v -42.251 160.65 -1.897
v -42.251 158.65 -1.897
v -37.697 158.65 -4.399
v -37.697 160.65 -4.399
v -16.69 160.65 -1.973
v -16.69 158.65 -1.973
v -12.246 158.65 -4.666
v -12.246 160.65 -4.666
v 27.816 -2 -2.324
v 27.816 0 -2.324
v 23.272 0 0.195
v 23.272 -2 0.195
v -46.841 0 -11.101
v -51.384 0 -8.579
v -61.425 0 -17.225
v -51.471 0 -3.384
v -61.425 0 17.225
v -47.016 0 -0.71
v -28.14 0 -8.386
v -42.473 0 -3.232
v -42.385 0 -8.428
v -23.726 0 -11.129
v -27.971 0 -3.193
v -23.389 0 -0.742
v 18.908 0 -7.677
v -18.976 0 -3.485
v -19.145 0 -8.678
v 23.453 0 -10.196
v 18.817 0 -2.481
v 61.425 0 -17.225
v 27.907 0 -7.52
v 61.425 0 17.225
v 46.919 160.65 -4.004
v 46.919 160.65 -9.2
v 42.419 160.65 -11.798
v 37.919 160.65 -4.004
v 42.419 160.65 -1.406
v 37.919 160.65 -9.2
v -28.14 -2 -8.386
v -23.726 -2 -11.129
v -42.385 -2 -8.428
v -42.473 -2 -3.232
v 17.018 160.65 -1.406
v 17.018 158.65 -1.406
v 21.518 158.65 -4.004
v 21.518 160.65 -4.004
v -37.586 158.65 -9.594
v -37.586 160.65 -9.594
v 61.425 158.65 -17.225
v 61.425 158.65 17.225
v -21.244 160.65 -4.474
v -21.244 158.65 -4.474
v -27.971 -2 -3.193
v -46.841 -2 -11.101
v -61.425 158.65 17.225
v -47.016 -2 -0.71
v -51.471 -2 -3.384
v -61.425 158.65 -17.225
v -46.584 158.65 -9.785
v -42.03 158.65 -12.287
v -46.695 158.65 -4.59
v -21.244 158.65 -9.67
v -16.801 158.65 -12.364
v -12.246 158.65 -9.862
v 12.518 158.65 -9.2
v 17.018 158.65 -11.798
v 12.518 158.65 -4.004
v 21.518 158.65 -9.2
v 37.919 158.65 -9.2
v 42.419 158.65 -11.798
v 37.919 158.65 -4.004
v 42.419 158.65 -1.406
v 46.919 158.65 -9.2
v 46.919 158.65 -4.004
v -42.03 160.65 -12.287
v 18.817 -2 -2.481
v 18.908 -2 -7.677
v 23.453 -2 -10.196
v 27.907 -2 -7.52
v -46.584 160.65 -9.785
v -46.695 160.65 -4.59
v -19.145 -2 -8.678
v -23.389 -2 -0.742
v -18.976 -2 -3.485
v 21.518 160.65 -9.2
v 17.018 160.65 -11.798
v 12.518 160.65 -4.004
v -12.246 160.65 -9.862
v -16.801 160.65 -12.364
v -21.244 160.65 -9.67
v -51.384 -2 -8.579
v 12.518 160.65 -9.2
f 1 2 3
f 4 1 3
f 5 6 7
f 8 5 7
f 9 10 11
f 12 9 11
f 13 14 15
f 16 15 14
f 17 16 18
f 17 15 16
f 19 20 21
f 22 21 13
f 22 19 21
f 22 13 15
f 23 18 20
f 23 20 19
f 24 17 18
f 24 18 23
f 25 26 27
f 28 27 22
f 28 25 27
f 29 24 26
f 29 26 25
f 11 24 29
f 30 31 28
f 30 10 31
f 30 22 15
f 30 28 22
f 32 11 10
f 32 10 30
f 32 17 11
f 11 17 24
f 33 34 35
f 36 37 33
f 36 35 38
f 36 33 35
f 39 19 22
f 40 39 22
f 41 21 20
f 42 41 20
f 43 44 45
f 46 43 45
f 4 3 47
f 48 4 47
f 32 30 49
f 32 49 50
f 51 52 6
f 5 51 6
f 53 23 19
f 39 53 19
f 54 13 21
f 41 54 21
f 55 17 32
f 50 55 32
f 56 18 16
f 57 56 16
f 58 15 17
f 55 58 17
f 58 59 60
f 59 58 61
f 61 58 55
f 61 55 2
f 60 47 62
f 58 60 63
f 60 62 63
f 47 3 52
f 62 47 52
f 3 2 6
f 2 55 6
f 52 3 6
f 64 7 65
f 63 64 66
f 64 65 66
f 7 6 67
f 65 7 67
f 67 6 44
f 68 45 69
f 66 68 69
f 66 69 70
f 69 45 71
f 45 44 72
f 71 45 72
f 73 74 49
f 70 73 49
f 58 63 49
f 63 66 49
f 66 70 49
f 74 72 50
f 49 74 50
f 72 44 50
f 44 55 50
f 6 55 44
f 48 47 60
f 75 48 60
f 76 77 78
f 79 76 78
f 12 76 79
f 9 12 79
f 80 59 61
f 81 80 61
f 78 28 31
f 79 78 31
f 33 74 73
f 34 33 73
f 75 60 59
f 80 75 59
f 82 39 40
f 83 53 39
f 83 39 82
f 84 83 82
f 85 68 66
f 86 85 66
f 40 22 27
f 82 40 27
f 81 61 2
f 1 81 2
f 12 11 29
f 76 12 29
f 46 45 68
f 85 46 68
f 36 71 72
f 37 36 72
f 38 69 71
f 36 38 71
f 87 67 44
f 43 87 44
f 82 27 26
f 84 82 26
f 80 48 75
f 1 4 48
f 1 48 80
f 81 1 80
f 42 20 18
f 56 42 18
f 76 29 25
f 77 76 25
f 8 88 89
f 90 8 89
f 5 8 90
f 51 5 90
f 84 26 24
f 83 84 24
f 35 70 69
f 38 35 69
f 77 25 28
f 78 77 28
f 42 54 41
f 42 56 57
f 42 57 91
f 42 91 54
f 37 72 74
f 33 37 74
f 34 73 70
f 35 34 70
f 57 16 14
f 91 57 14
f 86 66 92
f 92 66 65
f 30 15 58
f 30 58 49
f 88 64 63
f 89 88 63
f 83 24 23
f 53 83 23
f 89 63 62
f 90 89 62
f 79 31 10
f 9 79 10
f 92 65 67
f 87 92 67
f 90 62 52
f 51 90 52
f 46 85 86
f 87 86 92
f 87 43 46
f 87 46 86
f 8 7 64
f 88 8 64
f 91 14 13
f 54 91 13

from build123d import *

# Parameters (mm, degrees)
F0_W     = 122.85
F0_H     = 34.45
F2_DEPTH = 158.65
F3_DEPTH = 2
F7_DEPTH = 2


with BuildPart() as f2:
    # F0 (on Front) → F2 (new body)
    with BuildSketch(Plane.XZ):
        Rectangle(F0_W, F0_H)
    extrude(amount=-F2_DEPTH)

    # F1 (on Front) → F3 (join)
    with BuildSketch(Plane.XZ):
        Polygon((-46.840929, -11.1012), (-42.385265, -8.427801), (-42.472665, -3.232384), (-47.015728, -0.710365), (-51.471391, -3.383764), (-51.383992, -8.579181), align=None)
        Polygon((-23.726419, -11.12884), (-19.144532, -8.678063), (-18.976023, -3.484643), (-23.389402, -0.742001), (-27.97129, -3.192778), (-28.139798, -8.386198), align=None)
        Polygon((23.452608, -10.195813), (27.906654, -7.519719), (27.816112, -2.324356), (23.271524, 0.194914), (18.817478, -2.48118), (18.90802, -7.676543), align=None)
    extrude(amount=F3_DEPTH)

    # F6 (on face) → F7 (join)
    with BuildSketch(Plane(origin=(0, 158.65, 0), x_dir=(-1, 0, 0), z_dir=(0, 1, 0))):
        Polygon((37.586212, -9.593843), (42.029951, -12.287017), (46.584177, -9.785213), (46.694665, -4.590235), (42.250926, -1.897062), (37.696699, -4.398866), align=None)
        Polygon((16.800624, -12.363649), (21.244363, -9.670475), (21.244363, -4.474323), (16.690137, -1.972519), (12.246398, -4.665692), (12.246398, -9.861845), align=None)
        Polygon((-21.518063, -9.199932), (-17.018063, -11.798008), (-12.518063, -9.199932), (-12.518063, -4.00378), (-17.018063, -1.405703), (-21.518063, -4.00378), align=None)
        Polygon((-42.418962, -1.405703), (-46.918962, -4.00378), (-46.918962, -9.199932), (-42.418962, -11.798008), (-37.918962, -9.199932), (-37.918962, -4.00378), align=None)
    extrude(amount=F7_DEPTH)


solid = f2.part
